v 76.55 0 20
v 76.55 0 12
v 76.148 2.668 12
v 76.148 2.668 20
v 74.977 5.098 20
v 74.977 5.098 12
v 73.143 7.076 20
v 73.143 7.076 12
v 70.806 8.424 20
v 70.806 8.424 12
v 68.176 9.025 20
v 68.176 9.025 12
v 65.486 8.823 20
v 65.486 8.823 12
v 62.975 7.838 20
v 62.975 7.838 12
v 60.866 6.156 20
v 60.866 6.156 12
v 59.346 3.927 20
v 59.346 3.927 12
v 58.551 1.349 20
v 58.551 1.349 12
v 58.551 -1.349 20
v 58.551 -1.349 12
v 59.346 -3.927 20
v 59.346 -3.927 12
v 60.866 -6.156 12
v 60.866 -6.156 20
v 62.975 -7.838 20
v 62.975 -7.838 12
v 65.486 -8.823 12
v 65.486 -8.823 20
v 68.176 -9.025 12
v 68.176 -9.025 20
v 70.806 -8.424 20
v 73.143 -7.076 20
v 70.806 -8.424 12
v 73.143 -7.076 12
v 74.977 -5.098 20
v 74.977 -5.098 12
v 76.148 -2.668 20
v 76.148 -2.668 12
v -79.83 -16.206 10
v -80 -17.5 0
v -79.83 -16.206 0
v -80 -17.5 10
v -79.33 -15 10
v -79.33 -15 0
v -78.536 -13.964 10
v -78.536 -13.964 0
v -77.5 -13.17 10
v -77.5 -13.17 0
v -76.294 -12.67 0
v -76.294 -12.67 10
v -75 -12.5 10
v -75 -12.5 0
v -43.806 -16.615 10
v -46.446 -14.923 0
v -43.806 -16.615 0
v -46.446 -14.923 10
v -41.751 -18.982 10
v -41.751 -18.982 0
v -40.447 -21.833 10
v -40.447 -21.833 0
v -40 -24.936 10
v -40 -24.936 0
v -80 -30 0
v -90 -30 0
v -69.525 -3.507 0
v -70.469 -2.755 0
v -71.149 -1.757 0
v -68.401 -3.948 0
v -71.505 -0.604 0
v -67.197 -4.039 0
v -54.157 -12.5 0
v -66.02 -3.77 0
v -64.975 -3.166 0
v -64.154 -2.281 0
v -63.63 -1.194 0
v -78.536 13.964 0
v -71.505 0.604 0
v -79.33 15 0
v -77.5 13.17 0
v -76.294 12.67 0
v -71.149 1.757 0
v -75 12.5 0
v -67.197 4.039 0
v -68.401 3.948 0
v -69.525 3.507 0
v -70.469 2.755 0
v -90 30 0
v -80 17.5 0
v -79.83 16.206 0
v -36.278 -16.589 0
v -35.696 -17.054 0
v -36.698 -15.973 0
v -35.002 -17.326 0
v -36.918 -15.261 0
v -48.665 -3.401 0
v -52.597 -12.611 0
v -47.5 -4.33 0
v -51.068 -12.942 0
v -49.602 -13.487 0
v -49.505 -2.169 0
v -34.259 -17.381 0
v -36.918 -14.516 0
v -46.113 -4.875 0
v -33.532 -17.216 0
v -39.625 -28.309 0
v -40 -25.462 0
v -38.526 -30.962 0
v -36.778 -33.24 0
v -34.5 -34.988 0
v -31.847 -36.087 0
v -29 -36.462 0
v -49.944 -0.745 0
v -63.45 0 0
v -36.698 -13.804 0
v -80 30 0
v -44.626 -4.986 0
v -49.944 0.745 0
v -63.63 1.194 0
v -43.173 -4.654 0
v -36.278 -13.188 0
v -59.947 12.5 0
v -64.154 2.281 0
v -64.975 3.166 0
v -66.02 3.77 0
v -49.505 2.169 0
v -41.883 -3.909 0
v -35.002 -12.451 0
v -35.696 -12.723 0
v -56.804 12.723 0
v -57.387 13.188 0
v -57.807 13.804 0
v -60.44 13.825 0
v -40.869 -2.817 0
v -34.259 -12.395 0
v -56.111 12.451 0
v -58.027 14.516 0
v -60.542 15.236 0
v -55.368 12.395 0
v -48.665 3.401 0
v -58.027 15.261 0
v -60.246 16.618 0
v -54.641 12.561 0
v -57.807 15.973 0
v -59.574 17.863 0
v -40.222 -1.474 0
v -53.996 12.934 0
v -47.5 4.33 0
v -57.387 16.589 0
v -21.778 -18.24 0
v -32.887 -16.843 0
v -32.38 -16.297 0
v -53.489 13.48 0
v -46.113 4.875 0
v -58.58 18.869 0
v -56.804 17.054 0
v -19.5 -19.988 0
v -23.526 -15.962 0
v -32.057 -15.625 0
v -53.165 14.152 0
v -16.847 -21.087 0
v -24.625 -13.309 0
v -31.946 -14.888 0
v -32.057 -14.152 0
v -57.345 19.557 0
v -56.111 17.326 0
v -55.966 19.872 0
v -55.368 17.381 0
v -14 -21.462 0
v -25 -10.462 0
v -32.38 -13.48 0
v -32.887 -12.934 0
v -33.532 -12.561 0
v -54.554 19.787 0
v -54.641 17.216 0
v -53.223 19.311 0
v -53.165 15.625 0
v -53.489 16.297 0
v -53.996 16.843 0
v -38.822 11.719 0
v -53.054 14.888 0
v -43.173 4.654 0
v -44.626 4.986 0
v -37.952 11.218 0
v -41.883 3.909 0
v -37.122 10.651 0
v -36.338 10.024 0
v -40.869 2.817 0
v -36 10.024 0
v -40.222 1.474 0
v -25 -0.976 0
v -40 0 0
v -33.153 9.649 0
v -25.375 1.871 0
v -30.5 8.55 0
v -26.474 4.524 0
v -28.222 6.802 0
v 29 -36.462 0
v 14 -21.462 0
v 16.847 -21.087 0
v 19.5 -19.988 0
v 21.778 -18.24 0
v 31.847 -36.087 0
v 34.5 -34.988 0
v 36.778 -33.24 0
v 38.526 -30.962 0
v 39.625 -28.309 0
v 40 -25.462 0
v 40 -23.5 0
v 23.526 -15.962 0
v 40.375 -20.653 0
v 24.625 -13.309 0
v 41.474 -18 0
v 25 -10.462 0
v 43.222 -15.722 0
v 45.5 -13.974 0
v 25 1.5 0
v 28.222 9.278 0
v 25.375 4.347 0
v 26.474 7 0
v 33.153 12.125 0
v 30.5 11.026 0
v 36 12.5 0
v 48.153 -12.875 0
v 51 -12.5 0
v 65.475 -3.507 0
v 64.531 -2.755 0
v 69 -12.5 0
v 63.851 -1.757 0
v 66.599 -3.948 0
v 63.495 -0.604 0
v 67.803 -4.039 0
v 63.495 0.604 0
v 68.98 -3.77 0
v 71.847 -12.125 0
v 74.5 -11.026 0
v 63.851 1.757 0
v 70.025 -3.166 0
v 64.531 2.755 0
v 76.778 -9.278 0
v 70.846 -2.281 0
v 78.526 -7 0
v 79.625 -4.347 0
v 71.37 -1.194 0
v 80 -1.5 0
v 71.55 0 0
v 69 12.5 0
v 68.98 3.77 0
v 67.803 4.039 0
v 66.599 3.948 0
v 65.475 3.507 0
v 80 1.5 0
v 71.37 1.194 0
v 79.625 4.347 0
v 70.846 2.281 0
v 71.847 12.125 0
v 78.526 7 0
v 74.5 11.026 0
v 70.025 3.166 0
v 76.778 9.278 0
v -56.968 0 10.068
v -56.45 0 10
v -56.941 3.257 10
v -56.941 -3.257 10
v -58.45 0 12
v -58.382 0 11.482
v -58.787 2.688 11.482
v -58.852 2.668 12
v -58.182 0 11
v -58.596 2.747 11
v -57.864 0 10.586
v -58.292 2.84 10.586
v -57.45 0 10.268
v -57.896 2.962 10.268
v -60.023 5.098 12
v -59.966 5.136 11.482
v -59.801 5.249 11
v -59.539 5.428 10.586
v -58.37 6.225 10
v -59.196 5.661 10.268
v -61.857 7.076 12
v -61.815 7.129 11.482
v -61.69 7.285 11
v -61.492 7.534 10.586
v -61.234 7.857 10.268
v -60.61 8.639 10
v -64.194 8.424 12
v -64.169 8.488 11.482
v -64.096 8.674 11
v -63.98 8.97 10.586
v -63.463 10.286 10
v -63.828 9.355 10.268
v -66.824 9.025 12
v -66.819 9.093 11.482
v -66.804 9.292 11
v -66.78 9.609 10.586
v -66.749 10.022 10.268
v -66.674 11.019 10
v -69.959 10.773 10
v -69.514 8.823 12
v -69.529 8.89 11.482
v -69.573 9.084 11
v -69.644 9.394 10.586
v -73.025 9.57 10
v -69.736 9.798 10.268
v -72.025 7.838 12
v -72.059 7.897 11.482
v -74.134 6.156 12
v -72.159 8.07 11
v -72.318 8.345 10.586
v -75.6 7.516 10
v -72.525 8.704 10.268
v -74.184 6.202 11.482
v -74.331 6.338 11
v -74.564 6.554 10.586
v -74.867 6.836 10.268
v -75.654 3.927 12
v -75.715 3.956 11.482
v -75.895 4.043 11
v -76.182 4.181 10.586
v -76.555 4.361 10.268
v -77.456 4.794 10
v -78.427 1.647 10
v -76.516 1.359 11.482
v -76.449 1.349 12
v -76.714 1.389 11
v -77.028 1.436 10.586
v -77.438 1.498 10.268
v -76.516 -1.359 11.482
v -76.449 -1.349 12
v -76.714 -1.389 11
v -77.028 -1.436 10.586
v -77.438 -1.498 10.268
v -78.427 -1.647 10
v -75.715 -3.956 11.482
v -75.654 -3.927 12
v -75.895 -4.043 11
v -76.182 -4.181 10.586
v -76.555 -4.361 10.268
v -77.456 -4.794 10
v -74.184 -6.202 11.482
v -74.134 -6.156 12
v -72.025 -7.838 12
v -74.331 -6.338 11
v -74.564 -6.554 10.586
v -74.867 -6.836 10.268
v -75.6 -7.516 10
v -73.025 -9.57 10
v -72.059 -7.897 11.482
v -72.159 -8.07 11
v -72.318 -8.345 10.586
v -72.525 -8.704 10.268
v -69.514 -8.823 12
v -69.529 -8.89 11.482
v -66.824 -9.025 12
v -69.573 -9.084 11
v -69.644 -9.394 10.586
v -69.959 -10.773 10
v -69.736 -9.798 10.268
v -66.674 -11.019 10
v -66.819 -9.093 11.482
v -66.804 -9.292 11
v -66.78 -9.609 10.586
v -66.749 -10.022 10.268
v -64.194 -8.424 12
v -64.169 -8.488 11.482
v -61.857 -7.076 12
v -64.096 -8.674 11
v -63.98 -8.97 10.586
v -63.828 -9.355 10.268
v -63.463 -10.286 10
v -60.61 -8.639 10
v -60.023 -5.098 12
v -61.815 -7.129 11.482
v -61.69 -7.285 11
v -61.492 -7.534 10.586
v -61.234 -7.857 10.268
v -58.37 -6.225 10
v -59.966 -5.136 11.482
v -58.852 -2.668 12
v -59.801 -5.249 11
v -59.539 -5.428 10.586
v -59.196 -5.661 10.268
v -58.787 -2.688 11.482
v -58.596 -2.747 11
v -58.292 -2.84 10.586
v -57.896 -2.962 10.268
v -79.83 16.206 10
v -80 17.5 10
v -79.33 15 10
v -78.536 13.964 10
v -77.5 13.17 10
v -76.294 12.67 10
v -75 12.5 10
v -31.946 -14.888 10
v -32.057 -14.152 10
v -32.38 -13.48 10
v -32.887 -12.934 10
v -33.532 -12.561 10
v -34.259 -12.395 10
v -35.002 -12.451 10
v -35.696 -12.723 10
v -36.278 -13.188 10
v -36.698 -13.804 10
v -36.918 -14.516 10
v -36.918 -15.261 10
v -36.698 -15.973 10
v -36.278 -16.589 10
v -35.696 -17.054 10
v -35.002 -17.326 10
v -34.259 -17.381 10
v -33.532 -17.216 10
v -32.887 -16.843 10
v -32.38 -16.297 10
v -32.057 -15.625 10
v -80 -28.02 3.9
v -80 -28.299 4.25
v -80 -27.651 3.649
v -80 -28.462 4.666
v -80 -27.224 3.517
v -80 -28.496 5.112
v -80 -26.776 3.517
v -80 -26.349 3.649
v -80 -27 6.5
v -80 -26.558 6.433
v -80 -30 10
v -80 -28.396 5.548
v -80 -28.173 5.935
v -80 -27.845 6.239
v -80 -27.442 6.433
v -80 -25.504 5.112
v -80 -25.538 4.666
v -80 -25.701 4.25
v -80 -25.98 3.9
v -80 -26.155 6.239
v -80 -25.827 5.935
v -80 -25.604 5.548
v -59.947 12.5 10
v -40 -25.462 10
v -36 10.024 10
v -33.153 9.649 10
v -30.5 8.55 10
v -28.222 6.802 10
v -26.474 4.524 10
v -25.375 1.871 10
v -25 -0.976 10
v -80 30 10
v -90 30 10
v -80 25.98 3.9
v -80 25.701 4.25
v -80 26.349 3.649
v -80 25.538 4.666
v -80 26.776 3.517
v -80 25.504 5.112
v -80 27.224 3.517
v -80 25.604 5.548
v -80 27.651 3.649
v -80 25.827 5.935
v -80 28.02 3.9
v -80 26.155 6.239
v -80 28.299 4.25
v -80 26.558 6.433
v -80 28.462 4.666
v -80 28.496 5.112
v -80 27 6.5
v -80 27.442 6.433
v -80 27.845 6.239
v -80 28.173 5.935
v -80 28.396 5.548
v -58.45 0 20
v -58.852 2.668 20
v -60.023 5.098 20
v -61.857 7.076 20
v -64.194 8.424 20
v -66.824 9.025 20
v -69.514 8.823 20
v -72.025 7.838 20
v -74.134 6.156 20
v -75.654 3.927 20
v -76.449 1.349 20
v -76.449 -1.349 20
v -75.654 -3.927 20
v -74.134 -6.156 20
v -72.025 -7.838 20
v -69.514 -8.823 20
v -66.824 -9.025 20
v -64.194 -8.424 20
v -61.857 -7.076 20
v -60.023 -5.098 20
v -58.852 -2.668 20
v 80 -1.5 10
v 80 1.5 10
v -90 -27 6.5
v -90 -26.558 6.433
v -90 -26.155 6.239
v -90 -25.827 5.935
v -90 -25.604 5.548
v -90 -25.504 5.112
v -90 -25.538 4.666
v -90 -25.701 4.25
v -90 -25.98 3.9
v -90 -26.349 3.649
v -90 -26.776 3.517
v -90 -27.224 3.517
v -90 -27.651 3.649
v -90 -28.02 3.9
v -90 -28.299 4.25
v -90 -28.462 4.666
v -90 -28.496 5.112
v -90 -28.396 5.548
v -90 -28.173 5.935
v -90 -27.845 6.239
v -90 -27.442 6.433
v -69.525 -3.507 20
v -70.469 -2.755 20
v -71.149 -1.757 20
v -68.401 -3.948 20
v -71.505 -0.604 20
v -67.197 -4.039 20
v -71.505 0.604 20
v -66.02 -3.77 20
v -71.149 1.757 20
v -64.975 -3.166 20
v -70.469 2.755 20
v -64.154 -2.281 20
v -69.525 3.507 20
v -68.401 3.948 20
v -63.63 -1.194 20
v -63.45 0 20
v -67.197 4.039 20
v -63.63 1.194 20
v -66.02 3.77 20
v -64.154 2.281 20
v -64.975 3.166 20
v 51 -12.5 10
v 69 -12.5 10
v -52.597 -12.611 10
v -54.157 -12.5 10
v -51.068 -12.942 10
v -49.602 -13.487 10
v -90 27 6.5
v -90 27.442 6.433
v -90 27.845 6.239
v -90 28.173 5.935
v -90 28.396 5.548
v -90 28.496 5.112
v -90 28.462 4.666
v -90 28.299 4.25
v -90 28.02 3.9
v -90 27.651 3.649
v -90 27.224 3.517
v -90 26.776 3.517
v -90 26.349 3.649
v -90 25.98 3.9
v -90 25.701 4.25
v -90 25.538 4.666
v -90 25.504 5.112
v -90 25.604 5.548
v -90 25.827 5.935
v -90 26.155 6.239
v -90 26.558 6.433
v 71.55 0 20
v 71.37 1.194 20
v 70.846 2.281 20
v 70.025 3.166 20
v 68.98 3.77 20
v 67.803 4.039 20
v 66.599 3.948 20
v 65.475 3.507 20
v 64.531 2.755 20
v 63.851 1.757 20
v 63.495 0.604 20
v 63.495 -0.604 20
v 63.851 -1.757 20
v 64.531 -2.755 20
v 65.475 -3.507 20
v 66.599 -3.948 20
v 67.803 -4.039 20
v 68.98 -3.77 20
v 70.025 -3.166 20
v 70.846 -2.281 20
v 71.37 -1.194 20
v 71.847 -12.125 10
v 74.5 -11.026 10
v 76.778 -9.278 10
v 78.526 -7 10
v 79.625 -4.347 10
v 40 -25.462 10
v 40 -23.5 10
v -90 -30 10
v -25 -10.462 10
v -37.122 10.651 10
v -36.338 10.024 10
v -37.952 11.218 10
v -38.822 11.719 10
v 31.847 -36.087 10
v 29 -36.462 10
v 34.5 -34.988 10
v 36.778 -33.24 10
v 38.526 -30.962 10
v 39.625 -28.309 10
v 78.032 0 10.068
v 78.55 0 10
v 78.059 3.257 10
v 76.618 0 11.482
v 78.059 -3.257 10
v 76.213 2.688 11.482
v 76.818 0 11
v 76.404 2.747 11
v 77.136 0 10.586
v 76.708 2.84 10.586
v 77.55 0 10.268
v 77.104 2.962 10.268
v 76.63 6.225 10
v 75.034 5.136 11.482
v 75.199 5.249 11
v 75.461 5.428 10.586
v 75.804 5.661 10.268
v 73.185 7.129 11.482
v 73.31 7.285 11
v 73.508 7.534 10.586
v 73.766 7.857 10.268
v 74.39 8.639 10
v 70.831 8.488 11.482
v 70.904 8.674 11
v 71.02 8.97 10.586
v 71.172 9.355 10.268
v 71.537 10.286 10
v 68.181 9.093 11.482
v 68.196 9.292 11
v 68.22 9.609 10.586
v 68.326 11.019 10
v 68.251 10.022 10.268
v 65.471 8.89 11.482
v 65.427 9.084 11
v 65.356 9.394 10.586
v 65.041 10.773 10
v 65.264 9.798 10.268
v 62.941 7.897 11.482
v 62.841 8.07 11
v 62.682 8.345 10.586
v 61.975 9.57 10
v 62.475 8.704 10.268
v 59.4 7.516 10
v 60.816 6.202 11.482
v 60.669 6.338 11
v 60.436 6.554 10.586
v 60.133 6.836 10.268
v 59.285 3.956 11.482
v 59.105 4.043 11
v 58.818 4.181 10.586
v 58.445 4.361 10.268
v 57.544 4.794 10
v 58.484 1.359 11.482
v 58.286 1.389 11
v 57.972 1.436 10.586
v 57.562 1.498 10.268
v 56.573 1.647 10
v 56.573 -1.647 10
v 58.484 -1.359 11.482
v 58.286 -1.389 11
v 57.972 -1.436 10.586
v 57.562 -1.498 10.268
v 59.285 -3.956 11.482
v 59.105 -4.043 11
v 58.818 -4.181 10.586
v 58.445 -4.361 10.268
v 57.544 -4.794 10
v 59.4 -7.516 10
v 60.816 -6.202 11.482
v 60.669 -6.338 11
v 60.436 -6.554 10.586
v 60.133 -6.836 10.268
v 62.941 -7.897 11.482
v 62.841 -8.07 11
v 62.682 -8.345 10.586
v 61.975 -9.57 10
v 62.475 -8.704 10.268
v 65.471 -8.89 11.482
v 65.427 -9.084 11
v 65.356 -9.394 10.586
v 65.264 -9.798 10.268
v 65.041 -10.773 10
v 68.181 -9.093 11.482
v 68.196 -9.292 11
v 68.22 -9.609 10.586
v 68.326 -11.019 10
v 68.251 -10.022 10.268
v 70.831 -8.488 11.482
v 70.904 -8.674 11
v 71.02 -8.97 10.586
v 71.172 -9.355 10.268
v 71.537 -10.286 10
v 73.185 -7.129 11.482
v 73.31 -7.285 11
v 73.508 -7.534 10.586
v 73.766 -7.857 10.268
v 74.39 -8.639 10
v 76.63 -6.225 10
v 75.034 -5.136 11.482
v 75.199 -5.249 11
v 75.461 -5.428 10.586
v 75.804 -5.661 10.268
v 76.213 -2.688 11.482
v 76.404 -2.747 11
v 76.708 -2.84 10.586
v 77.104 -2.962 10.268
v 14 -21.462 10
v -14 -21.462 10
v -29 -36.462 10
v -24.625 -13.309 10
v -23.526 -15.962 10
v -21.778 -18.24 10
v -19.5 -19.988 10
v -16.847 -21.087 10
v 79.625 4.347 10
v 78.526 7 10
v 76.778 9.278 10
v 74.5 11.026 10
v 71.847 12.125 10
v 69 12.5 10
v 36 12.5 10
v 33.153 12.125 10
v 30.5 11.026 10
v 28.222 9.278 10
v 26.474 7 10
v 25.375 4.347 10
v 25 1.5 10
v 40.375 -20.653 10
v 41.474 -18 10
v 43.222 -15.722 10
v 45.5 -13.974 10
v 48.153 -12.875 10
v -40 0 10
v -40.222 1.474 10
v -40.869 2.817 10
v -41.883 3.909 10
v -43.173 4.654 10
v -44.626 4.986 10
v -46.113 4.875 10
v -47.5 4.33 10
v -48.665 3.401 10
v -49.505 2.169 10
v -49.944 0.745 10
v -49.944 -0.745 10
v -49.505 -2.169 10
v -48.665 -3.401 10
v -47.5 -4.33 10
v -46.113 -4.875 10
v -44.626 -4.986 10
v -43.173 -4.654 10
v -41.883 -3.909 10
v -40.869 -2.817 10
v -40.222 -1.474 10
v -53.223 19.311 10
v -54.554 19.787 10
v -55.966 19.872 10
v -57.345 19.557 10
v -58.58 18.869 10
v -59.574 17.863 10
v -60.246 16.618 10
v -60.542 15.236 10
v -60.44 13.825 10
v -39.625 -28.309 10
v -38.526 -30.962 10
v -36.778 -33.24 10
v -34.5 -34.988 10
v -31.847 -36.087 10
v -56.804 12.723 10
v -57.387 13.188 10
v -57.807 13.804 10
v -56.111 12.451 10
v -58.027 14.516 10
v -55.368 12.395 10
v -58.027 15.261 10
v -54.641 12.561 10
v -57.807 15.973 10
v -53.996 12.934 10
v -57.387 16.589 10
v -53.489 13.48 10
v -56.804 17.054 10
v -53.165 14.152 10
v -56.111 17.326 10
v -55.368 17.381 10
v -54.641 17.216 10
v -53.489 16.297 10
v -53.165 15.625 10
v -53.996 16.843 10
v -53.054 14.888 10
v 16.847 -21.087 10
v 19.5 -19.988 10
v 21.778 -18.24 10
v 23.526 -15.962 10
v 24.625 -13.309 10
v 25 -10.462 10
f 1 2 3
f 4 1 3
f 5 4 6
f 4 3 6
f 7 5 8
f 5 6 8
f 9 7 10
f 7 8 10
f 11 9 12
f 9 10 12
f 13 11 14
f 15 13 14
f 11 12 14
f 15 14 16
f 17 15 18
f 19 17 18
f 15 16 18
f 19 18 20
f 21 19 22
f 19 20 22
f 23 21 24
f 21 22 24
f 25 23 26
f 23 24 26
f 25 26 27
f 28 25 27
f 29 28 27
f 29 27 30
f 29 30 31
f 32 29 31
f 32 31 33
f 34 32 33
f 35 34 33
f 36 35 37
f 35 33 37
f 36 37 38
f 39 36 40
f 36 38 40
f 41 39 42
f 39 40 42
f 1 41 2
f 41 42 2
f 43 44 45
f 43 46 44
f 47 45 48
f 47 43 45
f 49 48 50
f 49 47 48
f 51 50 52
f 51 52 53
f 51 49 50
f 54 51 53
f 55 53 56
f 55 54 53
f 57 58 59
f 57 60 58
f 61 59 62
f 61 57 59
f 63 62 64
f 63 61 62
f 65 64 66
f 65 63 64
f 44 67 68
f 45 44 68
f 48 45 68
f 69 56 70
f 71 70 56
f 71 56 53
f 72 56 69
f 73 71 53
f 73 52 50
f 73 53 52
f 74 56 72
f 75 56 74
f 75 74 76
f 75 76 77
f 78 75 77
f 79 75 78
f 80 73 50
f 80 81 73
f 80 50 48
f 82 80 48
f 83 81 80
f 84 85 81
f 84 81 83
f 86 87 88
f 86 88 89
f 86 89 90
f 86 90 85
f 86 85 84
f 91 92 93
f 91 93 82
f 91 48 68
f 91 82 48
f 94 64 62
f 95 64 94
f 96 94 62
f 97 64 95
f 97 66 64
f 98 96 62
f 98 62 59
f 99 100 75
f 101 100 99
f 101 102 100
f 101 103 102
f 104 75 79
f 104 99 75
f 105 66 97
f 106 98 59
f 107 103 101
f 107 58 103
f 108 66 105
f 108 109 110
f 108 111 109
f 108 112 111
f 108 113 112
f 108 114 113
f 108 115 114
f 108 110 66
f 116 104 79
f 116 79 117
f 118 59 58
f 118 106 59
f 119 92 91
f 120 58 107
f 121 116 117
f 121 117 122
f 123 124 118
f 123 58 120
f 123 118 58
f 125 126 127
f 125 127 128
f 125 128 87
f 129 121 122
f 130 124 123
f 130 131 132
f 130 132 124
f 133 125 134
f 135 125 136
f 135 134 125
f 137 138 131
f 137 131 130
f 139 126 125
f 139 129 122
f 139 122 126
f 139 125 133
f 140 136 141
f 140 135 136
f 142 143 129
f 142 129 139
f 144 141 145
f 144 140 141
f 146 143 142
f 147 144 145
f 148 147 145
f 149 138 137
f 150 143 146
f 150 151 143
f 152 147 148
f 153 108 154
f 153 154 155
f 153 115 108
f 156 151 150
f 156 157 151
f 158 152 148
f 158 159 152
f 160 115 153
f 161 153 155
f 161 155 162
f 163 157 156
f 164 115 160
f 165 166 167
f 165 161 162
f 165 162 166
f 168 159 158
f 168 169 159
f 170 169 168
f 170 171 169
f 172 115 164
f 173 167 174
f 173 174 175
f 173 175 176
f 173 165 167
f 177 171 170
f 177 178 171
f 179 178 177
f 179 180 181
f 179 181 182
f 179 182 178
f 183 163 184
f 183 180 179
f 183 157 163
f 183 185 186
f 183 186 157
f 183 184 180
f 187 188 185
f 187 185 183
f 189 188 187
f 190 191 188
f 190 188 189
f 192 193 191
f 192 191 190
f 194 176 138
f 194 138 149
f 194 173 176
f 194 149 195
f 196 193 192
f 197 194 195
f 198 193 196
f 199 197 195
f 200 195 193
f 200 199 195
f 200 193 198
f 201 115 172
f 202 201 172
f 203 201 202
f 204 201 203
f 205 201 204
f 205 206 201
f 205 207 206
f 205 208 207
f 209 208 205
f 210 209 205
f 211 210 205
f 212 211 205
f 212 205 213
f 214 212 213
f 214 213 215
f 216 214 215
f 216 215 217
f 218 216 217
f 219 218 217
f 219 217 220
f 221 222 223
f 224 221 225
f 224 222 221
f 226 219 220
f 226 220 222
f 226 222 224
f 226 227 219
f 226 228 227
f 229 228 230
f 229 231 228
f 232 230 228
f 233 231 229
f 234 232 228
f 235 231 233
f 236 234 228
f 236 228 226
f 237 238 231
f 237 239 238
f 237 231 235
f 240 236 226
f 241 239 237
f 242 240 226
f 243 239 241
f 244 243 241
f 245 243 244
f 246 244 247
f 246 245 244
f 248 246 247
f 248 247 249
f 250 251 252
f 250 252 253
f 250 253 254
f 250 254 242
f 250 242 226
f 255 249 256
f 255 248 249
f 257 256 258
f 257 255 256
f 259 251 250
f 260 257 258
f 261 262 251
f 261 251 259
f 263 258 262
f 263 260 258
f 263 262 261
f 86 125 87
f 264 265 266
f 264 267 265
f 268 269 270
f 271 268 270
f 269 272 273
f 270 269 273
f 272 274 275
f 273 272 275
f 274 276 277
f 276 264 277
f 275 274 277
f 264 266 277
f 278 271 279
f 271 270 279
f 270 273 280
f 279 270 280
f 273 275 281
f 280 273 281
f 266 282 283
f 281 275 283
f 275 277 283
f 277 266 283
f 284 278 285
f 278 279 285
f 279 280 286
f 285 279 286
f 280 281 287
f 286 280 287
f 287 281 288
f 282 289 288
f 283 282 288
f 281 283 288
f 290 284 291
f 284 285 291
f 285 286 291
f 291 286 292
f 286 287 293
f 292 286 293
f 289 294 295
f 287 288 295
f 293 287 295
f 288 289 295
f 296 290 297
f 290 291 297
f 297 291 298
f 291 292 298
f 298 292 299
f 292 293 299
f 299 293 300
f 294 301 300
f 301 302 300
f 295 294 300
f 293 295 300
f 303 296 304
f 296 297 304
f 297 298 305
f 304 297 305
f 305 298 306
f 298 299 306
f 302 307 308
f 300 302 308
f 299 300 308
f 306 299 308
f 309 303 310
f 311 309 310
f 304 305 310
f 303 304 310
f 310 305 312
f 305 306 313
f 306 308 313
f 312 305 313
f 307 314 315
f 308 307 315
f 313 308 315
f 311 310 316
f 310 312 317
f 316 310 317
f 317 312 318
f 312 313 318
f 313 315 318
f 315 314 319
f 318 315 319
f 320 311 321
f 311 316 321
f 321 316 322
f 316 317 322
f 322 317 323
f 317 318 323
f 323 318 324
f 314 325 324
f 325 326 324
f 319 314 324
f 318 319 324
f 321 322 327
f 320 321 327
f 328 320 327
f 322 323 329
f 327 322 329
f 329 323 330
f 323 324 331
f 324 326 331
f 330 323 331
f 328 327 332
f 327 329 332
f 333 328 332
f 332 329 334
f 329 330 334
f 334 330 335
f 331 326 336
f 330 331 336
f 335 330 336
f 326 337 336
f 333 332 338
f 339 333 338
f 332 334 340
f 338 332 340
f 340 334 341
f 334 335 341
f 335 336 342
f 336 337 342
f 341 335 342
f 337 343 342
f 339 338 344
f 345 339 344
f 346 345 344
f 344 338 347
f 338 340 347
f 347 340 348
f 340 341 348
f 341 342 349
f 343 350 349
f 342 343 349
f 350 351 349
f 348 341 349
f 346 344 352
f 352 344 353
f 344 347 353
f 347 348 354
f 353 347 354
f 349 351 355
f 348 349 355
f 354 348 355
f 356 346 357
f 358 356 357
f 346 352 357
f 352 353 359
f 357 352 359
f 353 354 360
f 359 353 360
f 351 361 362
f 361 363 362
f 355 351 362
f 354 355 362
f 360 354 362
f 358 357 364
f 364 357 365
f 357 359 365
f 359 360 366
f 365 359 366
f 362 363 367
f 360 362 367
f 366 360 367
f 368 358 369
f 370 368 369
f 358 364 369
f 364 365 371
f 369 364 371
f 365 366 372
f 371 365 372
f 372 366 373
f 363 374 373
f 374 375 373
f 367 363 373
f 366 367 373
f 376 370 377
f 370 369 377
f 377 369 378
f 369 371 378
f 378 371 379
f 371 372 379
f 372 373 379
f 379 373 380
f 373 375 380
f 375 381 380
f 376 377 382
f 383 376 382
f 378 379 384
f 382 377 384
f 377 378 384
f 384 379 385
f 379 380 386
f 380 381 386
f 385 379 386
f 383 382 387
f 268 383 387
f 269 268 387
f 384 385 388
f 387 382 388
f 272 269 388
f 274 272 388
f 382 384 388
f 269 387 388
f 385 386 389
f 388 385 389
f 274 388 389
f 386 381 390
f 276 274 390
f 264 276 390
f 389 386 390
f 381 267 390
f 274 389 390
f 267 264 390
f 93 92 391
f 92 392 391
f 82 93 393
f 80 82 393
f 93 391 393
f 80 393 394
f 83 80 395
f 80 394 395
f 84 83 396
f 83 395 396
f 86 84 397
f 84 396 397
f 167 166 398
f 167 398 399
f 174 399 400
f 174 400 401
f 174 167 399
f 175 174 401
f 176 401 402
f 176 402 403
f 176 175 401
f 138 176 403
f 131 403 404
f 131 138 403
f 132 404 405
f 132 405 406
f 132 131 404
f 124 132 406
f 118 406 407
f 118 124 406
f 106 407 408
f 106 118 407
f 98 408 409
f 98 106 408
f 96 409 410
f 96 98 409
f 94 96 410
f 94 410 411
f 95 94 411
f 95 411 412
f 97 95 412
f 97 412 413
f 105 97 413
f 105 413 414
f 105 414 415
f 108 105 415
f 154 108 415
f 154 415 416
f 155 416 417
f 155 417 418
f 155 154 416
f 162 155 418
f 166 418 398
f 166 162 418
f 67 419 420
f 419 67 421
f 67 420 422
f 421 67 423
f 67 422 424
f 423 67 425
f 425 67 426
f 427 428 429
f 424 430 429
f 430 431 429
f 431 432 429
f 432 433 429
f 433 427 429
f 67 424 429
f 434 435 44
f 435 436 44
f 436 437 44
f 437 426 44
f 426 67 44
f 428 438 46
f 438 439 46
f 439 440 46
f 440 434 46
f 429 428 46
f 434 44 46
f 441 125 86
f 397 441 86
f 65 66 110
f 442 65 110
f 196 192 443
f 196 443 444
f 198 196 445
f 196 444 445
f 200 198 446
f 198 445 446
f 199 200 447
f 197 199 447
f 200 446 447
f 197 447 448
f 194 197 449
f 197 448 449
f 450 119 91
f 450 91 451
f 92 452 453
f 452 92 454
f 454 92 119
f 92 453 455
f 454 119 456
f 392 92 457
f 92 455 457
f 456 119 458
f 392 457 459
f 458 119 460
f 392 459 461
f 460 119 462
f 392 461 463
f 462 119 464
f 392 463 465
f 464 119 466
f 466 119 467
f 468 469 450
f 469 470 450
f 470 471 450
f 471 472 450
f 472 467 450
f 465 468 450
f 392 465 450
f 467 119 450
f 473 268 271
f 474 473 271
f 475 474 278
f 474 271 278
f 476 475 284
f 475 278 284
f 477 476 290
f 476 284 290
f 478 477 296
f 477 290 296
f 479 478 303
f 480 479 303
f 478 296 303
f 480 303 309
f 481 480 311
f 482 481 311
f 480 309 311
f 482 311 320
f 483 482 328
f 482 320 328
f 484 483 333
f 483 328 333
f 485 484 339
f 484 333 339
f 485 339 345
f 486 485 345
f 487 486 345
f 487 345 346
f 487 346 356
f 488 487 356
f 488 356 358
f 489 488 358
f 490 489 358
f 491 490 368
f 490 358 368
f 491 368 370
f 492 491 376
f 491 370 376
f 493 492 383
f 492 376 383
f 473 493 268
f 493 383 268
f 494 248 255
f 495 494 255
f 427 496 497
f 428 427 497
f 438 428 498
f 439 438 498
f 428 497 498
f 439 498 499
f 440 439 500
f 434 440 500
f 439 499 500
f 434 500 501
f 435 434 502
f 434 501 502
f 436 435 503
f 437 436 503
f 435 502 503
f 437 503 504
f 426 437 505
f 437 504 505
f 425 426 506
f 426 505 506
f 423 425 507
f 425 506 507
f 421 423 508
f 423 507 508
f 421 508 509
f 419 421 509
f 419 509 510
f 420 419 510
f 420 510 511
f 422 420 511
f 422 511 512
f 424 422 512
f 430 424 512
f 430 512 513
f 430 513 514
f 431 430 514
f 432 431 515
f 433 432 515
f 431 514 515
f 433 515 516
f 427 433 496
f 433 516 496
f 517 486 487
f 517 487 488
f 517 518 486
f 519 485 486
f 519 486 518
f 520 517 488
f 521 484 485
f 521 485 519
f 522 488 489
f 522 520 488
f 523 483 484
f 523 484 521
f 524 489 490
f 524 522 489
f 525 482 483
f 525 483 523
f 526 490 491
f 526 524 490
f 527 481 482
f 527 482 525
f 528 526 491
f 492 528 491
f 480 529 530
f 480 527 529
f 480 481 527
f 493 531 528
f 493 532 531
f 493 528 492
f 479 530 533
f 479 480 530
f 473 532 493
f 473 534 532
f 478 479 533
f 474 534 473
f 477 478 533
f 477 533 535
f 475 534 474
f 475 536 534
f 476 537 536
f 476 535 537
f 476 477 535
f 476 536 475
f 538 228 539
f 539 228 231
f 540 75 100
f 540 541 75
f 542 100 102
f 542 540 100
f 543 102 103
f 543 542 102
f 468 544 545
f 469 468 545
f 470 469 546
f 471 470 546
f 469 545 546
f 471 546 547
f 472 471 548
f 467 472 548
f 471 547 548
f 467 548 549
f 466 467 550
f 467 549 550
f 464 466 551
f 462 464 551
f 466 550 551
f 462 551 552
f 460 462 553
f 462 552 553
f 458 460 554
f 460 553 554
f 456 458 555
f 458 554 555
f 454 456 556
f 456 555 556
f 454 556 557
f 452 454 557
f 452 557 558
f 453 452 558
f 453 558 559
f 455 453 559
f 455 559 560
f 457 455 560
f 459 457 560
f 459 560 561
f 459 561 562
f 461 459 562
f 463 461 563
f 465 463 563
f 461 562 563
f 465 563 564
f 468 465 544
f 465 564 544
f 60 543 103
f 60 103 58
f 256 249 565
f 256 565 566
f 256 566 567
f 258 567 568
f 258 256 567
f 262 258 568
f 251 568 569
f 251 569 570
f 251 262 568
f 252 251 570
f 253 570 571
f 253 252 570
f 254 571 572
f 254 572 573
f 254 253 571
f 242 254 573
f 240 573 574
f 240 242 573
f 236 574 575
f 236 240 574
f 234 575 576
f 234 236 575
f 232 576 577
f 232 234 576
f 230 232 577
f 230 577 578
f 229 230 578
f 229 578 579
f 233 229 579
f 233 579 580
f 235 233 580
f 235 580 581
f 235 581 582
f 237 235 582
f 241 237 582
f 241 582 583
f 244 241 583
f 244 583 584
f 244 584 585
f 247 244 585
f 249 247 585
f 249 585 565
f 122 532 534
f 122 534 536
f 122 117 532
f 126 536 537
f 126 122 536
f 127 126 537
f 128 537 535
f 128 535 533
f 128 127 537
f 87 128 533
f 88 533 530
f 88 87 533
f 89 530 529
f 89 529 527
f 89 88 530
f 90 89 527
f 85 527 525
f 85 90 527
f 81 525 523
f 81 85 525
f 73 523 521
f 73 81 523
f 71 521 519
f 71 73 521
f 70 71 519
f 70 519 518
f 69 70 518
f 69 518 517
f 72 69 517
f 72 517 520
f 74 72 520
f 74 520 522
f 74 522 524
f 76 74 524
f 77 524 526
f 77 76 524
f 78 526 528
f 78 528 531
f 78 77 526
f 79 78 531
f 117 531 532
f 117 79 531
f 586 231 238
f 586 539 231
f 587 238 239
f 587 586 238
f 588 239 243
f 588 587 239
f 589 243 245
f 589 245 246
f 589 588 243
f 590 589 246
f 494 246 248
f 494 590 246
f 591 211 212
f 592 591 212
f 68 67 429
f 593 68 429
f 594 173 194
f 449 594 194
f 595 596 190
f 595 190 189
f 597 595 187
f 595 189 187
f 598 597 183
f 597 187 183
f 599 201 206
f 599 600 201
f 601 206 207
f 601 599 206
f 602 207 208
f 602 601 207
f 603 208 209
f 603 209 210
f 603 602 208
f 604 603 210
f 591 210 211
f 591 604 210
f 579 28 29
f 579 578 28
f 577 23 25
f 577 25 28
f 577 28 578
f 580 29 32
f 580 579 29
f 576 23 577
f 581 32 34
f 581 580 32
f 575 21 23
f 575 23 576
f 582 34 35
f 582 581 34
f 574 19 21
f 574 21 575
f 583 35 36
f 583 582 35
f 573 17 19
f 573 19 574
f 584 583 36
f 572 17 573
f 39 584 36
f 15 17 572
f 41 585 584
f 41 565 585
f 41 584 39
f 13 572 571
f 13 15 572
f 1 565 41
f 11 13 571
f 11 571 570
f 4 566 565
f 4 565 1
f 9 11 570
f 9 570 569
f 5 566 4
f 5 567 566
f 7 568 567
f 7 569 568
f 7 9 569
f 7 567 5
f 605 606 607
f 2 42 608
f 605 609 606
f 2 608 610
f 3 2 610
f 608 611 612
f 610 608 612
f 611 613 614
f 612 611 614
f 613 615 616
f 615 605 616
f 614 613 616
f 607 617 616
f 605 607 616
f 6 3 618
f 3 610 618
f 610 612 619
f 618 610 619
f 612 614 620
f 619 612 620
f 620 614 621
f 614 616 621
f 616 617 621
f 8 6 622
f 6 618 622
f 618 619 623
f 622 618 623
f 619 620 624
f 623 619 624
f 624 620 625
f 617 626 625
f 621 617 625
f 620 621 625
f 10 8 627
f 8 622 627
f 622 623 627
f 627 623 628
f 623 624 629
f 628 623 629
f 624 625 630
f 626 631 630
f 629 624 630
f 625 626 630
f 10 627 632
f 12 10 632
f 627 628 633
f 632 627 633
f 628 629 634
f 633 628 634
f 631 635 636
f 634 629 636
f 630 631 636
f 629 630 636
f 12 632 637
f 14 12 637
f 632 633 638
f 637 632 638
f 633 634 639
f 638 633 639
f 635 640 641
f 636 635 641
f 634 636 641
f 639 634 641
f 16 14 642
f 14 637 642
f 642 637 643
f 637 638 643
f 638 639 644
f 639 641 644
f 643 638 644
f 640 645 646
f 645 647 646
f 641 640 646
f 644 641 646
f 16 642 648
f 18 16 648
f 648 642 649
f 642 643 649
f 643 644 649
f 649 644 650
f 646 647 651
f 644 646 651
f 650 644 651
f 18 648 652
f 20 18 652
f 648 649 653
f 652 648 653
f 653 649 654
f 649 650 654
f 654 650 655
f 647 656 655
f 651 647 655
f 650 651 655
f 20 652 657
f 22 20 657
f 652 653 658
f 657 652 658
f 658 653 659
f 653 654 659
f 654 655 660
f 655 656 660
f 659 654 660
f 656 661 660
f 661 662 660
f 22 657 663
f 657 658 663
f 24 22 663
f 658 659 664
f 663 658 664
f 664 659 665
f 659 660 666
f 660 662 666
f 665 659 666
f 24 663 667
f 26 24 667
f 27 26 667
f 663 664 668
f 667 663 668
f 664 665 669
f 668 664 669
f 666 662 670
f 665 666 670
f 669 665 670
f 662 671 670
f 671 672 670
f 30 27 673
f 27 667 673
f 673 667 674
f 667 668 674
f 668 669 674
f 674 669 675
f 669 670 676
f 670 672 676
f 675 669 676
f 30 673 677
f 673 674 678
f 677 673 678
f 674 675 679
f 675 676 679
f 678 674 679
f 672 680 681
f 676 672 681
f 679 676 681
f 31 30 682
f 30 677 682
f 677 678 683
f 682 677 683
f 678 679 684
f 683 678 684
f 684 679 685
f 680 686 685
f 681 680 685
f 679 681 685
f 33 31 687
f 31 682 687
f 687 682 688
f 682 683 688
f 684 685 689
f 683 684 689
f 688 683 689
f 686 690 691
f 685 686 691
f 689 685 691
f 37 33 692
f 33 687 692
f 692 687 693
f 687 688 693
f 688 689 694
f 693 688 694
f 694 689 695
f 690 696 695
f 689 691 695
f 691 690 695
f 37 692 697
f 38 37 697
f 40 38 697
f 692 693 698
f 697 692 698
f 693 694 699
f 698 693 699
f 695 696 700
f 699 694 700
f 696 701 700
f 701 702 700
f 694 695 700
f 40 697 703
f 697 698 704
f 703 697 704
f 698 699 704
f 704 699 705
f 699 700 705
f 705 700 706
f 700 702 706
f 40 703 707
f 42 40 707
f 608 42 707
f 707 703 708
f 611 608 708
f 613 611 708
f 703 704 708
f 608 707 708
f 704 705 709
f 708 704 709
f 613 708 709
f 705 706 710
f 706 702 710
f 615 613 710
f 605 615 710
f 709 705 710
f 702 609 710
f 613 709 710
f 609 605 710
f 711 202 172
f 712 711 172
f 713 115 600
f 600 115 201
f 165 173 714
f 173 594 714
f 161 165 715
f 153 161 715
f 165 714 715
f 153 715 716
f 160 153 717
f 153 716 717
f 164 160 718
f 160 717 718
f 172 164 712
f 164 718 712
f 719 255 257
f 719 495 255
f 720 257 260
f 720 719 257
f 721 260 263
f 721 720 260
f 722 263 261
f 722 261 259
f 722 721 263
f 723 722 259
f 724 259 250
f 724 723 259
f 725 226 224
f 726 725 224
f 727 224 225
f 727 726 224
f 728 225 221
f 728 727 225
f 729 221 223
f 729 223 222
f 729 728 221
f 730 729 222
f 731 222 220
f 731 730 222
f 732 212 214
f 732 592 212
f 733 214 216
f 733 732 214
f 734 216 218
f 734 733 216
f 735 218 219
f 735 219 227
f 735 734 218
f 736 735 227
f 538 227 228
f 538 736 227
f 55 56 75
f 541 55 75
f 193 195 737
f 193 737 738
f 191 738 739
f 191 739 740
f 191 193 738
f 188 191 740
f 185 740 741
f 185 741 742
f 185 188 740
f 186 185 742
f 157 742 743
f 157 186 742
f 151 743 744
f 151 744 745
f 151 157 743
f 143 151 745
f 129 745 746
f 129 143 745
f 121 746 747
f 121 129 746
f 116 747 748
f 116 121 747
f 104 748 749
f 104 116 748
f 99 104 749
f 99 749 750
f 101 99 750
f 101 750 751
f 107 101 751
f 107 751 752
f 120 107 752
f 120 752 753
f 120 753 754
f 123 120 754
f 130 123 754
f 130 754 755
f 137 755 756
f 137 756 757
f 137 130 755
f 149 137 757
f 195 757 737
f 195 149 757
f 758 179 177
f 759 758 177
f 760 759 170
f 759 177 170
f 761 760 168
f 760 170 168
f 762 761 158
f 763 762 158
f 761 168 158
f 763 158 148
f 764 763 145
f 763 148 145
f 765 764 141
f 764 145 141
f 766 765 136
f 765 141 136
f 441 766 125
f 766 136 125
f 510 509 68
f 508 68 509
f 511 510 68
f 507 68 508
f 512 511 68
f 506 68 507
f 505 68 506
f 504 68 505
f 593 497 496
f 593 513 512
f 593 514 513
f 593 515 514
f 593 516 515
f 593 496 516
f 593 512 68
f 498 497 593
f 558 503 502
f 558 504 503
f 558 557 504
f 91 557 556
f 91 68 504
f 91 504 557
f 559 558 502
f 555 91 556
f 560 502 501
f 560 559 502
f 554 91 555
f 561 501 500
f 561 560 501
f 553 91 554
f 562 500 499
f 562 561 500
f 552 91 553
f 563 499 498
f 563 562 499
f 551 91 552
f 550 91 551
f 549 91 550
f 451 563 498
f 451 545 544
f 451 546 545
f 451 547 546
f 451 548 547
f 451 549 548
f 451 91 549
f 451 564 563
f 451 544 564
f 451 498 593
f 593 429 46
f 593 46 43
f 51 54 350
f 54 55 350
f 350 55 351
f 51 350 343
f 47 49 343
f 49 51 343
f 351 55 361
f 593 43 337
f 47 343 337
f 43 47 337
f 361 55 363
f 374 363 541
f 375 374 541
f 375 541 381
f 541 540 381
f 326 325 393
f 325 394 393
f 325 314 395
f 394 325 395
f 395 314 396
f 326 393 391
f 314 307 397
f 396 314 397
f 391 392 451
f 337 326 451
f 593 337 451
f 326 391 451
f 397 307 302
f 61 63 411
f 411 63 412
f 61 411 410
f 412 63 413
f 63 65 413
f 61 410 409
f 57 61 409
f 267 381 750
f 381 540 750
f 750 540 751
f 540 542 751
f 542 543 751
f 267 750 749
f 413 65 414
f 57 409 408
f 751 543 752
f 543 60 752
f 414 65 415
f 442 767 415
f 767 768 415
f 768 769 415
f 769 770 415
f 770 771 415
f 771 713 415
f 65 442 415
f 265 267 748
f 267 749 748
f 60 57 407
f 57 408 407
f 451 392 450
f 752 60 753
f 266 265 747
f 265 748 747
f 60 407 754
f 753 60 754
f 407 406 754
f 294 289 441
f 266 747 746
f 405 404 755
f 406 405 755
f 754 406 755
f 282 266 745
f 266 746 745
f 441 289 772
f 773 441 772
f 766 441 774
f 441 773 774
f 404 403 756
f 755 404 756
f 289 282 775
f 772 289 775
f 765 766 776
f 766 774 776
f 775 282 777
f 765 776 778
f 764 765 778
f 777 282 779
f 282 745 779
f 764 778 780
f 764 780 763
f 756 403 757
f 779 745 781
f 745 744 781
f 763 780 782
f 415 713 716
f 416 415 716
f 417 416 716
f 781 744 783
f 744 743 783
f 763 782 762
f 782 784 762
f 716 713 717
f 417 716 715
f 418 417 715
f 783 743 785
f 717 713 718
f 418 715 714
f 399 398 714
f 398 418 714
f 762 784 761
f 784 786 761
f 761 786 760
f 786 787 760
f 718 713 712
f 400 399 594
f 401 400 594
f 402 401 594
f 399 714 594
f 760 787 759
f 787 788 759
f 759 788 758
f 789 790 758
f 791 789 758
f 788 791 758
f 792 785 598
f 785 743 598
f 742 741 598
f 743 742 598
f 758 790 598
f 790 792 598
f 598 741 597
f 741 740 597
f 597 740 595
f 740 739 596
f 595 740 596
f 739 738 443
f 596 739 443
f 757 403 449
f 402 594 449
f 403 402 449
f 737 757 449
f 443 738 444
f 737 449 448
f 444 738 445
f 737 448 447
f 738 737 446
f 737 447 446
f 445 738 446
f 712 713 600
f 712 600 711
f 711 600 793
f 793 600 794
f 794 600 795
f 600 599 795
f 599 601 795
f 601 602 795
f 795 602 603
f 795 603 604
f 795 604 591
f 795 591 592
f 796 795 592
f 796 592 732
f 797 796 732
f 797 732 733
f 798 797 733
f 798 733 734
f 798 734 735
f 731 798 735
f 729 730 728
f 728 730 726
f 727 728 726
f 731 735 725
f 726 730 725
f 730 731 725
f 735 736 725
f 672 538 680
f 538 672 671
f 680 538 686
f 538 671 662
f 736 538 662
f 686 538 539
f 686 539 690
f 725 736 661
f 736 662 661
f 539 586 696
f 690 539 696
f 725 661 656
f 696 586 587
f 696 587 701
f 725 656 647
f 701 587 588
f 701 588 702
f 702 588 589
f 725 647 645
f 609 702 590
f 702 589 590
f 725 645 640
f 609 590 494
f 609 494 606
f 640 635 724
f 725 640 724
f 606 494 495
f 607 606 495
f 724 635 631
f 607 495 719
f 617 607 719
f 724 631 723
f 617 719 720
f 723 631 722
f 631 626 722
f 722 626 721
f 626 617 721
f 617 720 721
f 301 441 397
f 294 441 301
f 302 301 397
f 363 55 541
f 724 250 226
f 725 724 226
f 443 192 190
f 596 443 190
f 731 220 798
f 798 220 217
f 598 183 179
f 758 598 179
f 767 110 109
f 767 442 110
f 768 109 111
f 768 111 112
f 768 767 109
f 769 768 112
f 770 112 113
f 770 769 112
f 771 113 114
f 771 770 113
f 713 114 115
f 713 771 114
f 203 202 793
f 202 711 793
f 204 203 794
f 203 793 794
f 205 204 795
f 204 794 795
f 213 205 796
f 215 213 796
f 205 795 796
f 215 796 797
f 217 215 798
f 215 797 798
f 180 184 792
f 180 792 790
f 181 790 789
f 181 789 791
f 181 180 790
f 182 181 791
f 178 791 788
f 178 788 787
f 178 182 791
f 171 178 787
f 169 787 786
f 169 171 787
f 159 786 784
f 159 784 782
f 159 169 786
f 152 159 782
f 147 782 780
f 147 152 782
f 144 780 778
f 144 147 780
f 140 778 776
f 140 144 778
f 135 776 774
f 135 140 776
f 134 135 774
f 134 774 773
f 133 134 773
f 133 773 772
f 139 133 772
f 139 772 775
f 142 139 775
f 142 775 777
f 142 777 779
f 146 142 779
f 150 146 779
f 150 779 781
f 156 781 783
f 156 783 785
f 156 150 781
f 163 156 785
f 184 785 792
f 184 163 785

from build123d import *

# Parameters (mm, degrees)
SKETCH1_R           = 4.05
SKETCH1_R_2         = 5
SKETCH1_R_3         = 2.5
BOSS_EXTRUDE1_DEPTH = 10
FILLET1_R           = 11
SKETCH2_R           = 9.05
SKETCH2_R_2         = 4.05
BOSS_EXTRUDE2_DEPTH = 10
FILLET2_R           = 2
SKETCH3_W           = 10
SKETCH3_H           = 60
BOSS_EXTRUDE3_DEPTH = 10
FILLET3_R           = 5
SKETCH4_R           = 1.5
CUT_EXTRUDE1_DEPTH  = 10


with BuildPart() as part:
    # Sketch1 → Boss-Extrude1 (new body)
    with BuildSketch(Plane.XY):
        with BuildLine():
            Line((-80, -12.5), (-51.772571723, -12.5))
            Line((-51.772571723, -12.5), (-40, -17.854919158))
            Line((-40, -17.854919158), (-40, -36.461589484))
            Line((-40, -36.461589484), (40, -36.461589484))
            Line((40, -36.461589484), (40, -12.5))
            Line((40, -12.5), (80, -12.5))
            Line((80, -12.5), (80, 12.5))
            Line((80, 12.5), (25, 12.5))
            Line((25, 12.5), (25, -21.461589484))
            Line((25, -21.461589484), (-25, -21.461589484))
            Line((-25, -21.461589484), (-25, 10.023927765))
            Line((-25, 10.023927765), (-36.337703419, 10.023927765))
            ThreePointArc((-36.337703419, 10.023927765), (-37.531405043, 10.942330613), (-38.821632397, 11.719312422))
            Line((-38.821632397, 11.719312422), (-53.222645277, 19.311460171))
            ThreePointArc((-53.222645277, 19.311460171), (-59.112621671, 18.401196951), (-59.947052977, 12.5))
            Line((-59.947052977, 12.5), (-80, 12.5))
            Line((-80, 12.5), (-80, -12.5))
        make_face()
        with Locations((-67.5, 0)):
            Circle(SKETCH1_R, mode=Mode.SUBTRACT)
        with Locations((67.5, 0)):
            Circle(SKETCH1_R, mode=Mode.SUBTRACT)
        with Locations((-45, 0)):
            Circle(SKETCH1_R_2, mode=Mode.SUBTRACT)
        with Locations((-34.445576532, -14.888473571)):
            Circle(SKETCH1_R_3, mode=Mode.SUBTRACT)
        with Locations((-55.554423468, 14.888473571)):
            Circle(SKETCH1_R_3, mode=Mode.SUBTRACT)
    extrude(amount=BOSS_EXTRUDE1_DEPTH)

    # Fillet1
    fillet1_edges = [part.edges().sort_by_distance(p)[0] for p in [
        (80, 12.5, 5),
        (80, -12.5, 5),
        (40, -12.5, 5),
        (40, -36.461589484, 5),
        (-40, -36.461589484, 5),
        (-40, -17.854919158, 5),
        (-51.772571723, -12.5, 5),
        (-25, 10.023927765, 5),
        (-25, -21.461589484, 5),
        (25, -21.461589484, 5),
        (25, 12.5, 5),
    ]]
    fillet(fillet1_edges, radius=FILLET1_R)

    # Sketch2 → Boss-Extrude2 (add)
    with BuildSketch(Plane.XY.offset(10)):
        with Locations((-67.5, 0)):
            Circle(SKETCH2_R)
        with Locations((-67.5, 0)):
            Circle(SKETCH2_R_2, mode=Mode.SUBTRACT)
        with Locations((67.5, 0)):
            Circle(SKETCH2_R)
        with Locations((67.5, 0)):
            Circle(SKETCH2_R_2, mode=Mode.SUBTRACT)
    extrude(amount=BOSS_EXTRUDE2_DEPTH)

    # Fillet2
    fillet2_edges = [part.edges().sort_by_distance(p)[0] for p in [
        (-76.55, 0, 10),
        (58.45, 0, 10),
    ]]
    fillet(fillet2_edges, radius=FILLET2_R)

    # Sketch3 → Boss-Extrude3 (add)
    with BuildSketch(Plane.ZY.offset(80)):
        with Locations((5, 0)):
            Rectangle(SKETCH3_W, SKETCH3_H)
    extrude(amount=BOSS_EXTRUDE3_DEPTH)

    # Fillet3
    fillet3_edges = [part.edges().sort_by_distance(p)[0] for p in [
        (-80, -12.5, 5),
        (-80, 12.5, 5),
    ]]
    fillet(fillet3_edges, radius=FILLET3_R)

    # Sketch4 → Cut-Extrude1 (cut)
    with BuildSketch(Plane.ZY.offset(90)):
        with Locations((5, 27)):
            Circle(SKETCH4_R)
        with Locations((5, -27)):
            Circle(SKETCH4_R)
    extrude(amount=-CUT_EXTRUDE1_DEPTH, mode=Mode.SUBTRACT)


solid = part.part
